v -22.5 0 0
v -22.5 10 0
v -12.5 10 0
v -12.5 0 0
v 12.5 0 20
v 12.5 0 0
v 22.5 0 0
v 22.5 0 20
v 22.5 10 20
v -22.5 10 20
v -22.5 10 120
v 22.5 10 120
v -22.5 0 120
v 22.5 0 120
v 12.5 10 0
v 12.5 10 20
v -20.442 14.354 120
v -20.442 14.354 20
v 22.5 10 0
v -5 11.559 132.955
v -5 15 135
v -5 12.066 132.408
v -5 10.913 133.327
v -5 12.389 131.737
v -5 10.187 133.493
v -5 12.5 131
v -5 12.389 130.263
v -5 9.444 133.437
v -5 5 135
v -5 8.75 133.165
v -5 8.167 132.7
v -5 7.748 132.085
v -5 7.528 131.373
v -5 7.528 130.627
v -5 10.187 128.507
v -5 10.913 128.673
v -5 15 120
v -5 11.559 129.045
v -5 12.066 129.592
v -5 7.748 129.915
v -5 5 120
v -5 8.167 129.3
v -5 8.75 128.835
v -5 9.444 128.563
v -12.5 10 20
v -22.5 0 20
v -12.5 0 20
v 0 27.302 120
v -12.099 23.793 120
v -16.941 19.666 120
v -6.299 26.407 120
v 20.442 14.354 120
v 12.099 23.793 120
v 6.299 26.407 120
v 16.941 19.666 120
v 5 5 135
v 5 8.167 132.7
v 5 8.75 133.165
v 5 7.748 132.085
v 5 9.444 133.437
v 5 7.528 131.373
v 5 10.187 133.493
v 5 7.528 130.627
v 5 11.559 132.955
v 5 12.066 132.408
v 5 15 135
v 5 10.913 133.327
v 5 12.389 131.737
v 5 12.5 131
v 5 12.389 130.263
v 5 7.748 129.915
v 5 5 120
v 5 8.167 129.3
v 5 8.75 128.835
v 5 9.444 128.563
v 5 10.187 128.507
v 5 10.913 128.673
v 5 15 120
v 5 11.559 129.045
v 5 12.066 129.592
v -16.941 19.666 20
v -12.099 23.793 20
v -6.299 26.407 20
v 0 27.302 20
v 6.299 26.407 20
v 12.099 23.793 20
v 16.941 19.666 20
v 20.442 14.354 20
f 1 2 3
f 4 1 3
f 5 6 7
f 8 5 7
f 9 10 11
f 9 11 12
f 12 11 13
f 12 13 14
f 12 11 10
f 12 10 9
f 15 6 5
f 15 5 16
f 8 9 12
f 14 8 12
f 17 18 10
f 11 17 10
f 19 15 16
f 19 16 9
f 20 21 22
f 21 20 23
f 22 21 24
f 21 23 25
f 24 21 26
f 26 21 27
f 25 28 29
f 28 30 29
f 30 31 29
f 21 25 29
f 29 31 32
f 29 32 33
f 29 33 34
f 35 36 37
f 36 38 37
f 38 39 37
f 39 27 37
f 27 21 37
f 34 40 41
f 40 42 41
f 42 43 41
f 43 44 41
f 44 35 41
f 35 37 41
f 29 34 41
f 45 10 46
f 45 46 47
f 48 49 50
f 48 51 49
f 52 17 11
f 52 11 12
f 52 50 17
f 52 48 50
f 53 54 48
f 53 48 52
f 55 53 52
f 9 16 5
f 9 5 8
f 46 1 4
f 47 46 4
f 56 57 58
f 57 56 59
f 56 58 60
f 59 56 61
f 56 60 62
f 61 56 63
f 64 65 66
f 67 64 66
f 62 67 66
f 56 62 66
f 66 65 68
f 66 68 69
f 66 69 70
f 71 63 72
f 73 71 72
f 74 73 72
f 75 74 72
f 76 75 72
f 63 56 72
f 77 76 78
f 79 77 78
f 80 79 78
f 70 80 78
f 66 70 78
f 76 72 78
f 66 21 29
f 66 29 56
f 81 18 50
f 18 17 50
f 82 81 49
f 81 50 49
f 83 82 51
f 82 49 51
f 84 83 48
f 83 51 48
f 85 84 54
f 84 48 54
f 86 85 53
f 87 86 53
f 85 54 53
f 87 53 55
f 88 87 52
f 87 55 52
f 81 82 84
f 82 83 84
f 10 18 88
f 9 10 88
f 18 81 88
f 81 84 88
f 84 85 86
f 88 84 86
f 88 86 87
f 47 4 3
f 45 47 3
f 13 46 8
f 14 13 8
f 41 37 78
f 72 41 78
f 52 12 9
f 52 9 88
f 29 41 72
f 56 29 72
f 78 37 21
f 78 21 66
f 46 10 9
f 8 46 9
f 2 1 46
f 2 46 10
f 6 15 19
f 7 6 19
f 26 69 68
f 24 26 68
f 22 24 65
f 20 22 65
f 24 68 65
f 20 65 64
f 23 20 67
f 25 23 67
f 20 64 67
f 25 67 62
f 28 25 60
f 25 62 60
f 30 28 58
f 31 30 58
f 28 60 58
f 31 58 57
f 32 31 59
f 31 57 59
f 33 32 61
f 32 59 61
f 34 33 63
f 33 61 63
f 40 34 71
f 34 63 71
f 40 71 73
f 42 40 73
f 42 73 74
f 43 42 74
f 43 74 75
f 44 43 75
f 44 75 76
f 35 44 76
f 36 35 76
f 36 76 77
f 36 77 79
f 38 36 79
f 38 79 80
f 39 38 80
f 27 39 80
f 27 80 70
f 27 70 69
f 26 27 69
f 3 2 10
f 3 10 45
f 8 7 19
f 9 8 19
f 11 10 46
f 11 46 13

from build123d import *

# Parameters (mm, degrees)
F0_W      = 10
F0_H      = 10
F1_DEPTH  = 20
F3_DEPTH  = 100
F4_R      = 22.610669
F3_FACE_W = 45
F3_FACE_H = 100
F5_DEPTH  = 10
F6_W      = 10
F6_H      = 5
F7_DEPTH  = 15
F8_R      = 2.5
F9_DEPTH  = 25


with BuildPart() as f1:
    # F0 (on Top) → F1 (new body)
    with BuildSketch(Plane.XY):
        with Locations((17.5, 5)):
            Rectangle(F0_W, F0_H)
        with Locations((-17.5, 5)):
            Rectangle(F0_W, F0_H)
    extrude(amount=F1_DEPTH)


with BuildPart() as f3:
    # F2 (on face) → F3 (new body)
    with BuildSketch(Plane.XY.offset(20)):
        Polygon((0, 57.602007), (-22.5, 10), (-12.5, 10), (22.5, 10), align=None)
    extrude(amount=F3_DEPTH)

    # F4
    f4_edges = [f3.edges().sort_by_distance(p)[0] for p in [
        (0, 57.602007, 70),
    ]]
    fillet(f4_edges, radius=F4_R)


with BuildPart() as f5:
    # F3_face (on face) → F5 (new body)
    with BuildSketch(Plane(origin=(0, 10, 70), x_dir=(1, 0, 0), z_dir=(0, -1, 0))):
        Rectangle(F3_FACE_W, F3_FACE_H)
    extrude(amount=F5_DEPTH)


with BuildPart() as f7:
    # F6 (on face) → F7 (new body)
    with BuildSketch(Plane.XY.offset(120)):
        with Locations((0, 12.5)):
            Rectangle(F6_W, F6_H)
        with Locations((0, 7.5)):
            Rectangle(F6_W, F6_H)
    extrude(amount=F7_DEPTH)

    # F8 (on face) → F9 (cut)
    with BuildSketch(Plane.YZ.offset(5)):
        with Locations((10, 131)):
            Circle(F8_R)
    extrude(amount=-F9_DEPTH, mode=Mode.SUBTRACT)


solid = Compound([f1.part, f3.part, f5.part, f7.part])
